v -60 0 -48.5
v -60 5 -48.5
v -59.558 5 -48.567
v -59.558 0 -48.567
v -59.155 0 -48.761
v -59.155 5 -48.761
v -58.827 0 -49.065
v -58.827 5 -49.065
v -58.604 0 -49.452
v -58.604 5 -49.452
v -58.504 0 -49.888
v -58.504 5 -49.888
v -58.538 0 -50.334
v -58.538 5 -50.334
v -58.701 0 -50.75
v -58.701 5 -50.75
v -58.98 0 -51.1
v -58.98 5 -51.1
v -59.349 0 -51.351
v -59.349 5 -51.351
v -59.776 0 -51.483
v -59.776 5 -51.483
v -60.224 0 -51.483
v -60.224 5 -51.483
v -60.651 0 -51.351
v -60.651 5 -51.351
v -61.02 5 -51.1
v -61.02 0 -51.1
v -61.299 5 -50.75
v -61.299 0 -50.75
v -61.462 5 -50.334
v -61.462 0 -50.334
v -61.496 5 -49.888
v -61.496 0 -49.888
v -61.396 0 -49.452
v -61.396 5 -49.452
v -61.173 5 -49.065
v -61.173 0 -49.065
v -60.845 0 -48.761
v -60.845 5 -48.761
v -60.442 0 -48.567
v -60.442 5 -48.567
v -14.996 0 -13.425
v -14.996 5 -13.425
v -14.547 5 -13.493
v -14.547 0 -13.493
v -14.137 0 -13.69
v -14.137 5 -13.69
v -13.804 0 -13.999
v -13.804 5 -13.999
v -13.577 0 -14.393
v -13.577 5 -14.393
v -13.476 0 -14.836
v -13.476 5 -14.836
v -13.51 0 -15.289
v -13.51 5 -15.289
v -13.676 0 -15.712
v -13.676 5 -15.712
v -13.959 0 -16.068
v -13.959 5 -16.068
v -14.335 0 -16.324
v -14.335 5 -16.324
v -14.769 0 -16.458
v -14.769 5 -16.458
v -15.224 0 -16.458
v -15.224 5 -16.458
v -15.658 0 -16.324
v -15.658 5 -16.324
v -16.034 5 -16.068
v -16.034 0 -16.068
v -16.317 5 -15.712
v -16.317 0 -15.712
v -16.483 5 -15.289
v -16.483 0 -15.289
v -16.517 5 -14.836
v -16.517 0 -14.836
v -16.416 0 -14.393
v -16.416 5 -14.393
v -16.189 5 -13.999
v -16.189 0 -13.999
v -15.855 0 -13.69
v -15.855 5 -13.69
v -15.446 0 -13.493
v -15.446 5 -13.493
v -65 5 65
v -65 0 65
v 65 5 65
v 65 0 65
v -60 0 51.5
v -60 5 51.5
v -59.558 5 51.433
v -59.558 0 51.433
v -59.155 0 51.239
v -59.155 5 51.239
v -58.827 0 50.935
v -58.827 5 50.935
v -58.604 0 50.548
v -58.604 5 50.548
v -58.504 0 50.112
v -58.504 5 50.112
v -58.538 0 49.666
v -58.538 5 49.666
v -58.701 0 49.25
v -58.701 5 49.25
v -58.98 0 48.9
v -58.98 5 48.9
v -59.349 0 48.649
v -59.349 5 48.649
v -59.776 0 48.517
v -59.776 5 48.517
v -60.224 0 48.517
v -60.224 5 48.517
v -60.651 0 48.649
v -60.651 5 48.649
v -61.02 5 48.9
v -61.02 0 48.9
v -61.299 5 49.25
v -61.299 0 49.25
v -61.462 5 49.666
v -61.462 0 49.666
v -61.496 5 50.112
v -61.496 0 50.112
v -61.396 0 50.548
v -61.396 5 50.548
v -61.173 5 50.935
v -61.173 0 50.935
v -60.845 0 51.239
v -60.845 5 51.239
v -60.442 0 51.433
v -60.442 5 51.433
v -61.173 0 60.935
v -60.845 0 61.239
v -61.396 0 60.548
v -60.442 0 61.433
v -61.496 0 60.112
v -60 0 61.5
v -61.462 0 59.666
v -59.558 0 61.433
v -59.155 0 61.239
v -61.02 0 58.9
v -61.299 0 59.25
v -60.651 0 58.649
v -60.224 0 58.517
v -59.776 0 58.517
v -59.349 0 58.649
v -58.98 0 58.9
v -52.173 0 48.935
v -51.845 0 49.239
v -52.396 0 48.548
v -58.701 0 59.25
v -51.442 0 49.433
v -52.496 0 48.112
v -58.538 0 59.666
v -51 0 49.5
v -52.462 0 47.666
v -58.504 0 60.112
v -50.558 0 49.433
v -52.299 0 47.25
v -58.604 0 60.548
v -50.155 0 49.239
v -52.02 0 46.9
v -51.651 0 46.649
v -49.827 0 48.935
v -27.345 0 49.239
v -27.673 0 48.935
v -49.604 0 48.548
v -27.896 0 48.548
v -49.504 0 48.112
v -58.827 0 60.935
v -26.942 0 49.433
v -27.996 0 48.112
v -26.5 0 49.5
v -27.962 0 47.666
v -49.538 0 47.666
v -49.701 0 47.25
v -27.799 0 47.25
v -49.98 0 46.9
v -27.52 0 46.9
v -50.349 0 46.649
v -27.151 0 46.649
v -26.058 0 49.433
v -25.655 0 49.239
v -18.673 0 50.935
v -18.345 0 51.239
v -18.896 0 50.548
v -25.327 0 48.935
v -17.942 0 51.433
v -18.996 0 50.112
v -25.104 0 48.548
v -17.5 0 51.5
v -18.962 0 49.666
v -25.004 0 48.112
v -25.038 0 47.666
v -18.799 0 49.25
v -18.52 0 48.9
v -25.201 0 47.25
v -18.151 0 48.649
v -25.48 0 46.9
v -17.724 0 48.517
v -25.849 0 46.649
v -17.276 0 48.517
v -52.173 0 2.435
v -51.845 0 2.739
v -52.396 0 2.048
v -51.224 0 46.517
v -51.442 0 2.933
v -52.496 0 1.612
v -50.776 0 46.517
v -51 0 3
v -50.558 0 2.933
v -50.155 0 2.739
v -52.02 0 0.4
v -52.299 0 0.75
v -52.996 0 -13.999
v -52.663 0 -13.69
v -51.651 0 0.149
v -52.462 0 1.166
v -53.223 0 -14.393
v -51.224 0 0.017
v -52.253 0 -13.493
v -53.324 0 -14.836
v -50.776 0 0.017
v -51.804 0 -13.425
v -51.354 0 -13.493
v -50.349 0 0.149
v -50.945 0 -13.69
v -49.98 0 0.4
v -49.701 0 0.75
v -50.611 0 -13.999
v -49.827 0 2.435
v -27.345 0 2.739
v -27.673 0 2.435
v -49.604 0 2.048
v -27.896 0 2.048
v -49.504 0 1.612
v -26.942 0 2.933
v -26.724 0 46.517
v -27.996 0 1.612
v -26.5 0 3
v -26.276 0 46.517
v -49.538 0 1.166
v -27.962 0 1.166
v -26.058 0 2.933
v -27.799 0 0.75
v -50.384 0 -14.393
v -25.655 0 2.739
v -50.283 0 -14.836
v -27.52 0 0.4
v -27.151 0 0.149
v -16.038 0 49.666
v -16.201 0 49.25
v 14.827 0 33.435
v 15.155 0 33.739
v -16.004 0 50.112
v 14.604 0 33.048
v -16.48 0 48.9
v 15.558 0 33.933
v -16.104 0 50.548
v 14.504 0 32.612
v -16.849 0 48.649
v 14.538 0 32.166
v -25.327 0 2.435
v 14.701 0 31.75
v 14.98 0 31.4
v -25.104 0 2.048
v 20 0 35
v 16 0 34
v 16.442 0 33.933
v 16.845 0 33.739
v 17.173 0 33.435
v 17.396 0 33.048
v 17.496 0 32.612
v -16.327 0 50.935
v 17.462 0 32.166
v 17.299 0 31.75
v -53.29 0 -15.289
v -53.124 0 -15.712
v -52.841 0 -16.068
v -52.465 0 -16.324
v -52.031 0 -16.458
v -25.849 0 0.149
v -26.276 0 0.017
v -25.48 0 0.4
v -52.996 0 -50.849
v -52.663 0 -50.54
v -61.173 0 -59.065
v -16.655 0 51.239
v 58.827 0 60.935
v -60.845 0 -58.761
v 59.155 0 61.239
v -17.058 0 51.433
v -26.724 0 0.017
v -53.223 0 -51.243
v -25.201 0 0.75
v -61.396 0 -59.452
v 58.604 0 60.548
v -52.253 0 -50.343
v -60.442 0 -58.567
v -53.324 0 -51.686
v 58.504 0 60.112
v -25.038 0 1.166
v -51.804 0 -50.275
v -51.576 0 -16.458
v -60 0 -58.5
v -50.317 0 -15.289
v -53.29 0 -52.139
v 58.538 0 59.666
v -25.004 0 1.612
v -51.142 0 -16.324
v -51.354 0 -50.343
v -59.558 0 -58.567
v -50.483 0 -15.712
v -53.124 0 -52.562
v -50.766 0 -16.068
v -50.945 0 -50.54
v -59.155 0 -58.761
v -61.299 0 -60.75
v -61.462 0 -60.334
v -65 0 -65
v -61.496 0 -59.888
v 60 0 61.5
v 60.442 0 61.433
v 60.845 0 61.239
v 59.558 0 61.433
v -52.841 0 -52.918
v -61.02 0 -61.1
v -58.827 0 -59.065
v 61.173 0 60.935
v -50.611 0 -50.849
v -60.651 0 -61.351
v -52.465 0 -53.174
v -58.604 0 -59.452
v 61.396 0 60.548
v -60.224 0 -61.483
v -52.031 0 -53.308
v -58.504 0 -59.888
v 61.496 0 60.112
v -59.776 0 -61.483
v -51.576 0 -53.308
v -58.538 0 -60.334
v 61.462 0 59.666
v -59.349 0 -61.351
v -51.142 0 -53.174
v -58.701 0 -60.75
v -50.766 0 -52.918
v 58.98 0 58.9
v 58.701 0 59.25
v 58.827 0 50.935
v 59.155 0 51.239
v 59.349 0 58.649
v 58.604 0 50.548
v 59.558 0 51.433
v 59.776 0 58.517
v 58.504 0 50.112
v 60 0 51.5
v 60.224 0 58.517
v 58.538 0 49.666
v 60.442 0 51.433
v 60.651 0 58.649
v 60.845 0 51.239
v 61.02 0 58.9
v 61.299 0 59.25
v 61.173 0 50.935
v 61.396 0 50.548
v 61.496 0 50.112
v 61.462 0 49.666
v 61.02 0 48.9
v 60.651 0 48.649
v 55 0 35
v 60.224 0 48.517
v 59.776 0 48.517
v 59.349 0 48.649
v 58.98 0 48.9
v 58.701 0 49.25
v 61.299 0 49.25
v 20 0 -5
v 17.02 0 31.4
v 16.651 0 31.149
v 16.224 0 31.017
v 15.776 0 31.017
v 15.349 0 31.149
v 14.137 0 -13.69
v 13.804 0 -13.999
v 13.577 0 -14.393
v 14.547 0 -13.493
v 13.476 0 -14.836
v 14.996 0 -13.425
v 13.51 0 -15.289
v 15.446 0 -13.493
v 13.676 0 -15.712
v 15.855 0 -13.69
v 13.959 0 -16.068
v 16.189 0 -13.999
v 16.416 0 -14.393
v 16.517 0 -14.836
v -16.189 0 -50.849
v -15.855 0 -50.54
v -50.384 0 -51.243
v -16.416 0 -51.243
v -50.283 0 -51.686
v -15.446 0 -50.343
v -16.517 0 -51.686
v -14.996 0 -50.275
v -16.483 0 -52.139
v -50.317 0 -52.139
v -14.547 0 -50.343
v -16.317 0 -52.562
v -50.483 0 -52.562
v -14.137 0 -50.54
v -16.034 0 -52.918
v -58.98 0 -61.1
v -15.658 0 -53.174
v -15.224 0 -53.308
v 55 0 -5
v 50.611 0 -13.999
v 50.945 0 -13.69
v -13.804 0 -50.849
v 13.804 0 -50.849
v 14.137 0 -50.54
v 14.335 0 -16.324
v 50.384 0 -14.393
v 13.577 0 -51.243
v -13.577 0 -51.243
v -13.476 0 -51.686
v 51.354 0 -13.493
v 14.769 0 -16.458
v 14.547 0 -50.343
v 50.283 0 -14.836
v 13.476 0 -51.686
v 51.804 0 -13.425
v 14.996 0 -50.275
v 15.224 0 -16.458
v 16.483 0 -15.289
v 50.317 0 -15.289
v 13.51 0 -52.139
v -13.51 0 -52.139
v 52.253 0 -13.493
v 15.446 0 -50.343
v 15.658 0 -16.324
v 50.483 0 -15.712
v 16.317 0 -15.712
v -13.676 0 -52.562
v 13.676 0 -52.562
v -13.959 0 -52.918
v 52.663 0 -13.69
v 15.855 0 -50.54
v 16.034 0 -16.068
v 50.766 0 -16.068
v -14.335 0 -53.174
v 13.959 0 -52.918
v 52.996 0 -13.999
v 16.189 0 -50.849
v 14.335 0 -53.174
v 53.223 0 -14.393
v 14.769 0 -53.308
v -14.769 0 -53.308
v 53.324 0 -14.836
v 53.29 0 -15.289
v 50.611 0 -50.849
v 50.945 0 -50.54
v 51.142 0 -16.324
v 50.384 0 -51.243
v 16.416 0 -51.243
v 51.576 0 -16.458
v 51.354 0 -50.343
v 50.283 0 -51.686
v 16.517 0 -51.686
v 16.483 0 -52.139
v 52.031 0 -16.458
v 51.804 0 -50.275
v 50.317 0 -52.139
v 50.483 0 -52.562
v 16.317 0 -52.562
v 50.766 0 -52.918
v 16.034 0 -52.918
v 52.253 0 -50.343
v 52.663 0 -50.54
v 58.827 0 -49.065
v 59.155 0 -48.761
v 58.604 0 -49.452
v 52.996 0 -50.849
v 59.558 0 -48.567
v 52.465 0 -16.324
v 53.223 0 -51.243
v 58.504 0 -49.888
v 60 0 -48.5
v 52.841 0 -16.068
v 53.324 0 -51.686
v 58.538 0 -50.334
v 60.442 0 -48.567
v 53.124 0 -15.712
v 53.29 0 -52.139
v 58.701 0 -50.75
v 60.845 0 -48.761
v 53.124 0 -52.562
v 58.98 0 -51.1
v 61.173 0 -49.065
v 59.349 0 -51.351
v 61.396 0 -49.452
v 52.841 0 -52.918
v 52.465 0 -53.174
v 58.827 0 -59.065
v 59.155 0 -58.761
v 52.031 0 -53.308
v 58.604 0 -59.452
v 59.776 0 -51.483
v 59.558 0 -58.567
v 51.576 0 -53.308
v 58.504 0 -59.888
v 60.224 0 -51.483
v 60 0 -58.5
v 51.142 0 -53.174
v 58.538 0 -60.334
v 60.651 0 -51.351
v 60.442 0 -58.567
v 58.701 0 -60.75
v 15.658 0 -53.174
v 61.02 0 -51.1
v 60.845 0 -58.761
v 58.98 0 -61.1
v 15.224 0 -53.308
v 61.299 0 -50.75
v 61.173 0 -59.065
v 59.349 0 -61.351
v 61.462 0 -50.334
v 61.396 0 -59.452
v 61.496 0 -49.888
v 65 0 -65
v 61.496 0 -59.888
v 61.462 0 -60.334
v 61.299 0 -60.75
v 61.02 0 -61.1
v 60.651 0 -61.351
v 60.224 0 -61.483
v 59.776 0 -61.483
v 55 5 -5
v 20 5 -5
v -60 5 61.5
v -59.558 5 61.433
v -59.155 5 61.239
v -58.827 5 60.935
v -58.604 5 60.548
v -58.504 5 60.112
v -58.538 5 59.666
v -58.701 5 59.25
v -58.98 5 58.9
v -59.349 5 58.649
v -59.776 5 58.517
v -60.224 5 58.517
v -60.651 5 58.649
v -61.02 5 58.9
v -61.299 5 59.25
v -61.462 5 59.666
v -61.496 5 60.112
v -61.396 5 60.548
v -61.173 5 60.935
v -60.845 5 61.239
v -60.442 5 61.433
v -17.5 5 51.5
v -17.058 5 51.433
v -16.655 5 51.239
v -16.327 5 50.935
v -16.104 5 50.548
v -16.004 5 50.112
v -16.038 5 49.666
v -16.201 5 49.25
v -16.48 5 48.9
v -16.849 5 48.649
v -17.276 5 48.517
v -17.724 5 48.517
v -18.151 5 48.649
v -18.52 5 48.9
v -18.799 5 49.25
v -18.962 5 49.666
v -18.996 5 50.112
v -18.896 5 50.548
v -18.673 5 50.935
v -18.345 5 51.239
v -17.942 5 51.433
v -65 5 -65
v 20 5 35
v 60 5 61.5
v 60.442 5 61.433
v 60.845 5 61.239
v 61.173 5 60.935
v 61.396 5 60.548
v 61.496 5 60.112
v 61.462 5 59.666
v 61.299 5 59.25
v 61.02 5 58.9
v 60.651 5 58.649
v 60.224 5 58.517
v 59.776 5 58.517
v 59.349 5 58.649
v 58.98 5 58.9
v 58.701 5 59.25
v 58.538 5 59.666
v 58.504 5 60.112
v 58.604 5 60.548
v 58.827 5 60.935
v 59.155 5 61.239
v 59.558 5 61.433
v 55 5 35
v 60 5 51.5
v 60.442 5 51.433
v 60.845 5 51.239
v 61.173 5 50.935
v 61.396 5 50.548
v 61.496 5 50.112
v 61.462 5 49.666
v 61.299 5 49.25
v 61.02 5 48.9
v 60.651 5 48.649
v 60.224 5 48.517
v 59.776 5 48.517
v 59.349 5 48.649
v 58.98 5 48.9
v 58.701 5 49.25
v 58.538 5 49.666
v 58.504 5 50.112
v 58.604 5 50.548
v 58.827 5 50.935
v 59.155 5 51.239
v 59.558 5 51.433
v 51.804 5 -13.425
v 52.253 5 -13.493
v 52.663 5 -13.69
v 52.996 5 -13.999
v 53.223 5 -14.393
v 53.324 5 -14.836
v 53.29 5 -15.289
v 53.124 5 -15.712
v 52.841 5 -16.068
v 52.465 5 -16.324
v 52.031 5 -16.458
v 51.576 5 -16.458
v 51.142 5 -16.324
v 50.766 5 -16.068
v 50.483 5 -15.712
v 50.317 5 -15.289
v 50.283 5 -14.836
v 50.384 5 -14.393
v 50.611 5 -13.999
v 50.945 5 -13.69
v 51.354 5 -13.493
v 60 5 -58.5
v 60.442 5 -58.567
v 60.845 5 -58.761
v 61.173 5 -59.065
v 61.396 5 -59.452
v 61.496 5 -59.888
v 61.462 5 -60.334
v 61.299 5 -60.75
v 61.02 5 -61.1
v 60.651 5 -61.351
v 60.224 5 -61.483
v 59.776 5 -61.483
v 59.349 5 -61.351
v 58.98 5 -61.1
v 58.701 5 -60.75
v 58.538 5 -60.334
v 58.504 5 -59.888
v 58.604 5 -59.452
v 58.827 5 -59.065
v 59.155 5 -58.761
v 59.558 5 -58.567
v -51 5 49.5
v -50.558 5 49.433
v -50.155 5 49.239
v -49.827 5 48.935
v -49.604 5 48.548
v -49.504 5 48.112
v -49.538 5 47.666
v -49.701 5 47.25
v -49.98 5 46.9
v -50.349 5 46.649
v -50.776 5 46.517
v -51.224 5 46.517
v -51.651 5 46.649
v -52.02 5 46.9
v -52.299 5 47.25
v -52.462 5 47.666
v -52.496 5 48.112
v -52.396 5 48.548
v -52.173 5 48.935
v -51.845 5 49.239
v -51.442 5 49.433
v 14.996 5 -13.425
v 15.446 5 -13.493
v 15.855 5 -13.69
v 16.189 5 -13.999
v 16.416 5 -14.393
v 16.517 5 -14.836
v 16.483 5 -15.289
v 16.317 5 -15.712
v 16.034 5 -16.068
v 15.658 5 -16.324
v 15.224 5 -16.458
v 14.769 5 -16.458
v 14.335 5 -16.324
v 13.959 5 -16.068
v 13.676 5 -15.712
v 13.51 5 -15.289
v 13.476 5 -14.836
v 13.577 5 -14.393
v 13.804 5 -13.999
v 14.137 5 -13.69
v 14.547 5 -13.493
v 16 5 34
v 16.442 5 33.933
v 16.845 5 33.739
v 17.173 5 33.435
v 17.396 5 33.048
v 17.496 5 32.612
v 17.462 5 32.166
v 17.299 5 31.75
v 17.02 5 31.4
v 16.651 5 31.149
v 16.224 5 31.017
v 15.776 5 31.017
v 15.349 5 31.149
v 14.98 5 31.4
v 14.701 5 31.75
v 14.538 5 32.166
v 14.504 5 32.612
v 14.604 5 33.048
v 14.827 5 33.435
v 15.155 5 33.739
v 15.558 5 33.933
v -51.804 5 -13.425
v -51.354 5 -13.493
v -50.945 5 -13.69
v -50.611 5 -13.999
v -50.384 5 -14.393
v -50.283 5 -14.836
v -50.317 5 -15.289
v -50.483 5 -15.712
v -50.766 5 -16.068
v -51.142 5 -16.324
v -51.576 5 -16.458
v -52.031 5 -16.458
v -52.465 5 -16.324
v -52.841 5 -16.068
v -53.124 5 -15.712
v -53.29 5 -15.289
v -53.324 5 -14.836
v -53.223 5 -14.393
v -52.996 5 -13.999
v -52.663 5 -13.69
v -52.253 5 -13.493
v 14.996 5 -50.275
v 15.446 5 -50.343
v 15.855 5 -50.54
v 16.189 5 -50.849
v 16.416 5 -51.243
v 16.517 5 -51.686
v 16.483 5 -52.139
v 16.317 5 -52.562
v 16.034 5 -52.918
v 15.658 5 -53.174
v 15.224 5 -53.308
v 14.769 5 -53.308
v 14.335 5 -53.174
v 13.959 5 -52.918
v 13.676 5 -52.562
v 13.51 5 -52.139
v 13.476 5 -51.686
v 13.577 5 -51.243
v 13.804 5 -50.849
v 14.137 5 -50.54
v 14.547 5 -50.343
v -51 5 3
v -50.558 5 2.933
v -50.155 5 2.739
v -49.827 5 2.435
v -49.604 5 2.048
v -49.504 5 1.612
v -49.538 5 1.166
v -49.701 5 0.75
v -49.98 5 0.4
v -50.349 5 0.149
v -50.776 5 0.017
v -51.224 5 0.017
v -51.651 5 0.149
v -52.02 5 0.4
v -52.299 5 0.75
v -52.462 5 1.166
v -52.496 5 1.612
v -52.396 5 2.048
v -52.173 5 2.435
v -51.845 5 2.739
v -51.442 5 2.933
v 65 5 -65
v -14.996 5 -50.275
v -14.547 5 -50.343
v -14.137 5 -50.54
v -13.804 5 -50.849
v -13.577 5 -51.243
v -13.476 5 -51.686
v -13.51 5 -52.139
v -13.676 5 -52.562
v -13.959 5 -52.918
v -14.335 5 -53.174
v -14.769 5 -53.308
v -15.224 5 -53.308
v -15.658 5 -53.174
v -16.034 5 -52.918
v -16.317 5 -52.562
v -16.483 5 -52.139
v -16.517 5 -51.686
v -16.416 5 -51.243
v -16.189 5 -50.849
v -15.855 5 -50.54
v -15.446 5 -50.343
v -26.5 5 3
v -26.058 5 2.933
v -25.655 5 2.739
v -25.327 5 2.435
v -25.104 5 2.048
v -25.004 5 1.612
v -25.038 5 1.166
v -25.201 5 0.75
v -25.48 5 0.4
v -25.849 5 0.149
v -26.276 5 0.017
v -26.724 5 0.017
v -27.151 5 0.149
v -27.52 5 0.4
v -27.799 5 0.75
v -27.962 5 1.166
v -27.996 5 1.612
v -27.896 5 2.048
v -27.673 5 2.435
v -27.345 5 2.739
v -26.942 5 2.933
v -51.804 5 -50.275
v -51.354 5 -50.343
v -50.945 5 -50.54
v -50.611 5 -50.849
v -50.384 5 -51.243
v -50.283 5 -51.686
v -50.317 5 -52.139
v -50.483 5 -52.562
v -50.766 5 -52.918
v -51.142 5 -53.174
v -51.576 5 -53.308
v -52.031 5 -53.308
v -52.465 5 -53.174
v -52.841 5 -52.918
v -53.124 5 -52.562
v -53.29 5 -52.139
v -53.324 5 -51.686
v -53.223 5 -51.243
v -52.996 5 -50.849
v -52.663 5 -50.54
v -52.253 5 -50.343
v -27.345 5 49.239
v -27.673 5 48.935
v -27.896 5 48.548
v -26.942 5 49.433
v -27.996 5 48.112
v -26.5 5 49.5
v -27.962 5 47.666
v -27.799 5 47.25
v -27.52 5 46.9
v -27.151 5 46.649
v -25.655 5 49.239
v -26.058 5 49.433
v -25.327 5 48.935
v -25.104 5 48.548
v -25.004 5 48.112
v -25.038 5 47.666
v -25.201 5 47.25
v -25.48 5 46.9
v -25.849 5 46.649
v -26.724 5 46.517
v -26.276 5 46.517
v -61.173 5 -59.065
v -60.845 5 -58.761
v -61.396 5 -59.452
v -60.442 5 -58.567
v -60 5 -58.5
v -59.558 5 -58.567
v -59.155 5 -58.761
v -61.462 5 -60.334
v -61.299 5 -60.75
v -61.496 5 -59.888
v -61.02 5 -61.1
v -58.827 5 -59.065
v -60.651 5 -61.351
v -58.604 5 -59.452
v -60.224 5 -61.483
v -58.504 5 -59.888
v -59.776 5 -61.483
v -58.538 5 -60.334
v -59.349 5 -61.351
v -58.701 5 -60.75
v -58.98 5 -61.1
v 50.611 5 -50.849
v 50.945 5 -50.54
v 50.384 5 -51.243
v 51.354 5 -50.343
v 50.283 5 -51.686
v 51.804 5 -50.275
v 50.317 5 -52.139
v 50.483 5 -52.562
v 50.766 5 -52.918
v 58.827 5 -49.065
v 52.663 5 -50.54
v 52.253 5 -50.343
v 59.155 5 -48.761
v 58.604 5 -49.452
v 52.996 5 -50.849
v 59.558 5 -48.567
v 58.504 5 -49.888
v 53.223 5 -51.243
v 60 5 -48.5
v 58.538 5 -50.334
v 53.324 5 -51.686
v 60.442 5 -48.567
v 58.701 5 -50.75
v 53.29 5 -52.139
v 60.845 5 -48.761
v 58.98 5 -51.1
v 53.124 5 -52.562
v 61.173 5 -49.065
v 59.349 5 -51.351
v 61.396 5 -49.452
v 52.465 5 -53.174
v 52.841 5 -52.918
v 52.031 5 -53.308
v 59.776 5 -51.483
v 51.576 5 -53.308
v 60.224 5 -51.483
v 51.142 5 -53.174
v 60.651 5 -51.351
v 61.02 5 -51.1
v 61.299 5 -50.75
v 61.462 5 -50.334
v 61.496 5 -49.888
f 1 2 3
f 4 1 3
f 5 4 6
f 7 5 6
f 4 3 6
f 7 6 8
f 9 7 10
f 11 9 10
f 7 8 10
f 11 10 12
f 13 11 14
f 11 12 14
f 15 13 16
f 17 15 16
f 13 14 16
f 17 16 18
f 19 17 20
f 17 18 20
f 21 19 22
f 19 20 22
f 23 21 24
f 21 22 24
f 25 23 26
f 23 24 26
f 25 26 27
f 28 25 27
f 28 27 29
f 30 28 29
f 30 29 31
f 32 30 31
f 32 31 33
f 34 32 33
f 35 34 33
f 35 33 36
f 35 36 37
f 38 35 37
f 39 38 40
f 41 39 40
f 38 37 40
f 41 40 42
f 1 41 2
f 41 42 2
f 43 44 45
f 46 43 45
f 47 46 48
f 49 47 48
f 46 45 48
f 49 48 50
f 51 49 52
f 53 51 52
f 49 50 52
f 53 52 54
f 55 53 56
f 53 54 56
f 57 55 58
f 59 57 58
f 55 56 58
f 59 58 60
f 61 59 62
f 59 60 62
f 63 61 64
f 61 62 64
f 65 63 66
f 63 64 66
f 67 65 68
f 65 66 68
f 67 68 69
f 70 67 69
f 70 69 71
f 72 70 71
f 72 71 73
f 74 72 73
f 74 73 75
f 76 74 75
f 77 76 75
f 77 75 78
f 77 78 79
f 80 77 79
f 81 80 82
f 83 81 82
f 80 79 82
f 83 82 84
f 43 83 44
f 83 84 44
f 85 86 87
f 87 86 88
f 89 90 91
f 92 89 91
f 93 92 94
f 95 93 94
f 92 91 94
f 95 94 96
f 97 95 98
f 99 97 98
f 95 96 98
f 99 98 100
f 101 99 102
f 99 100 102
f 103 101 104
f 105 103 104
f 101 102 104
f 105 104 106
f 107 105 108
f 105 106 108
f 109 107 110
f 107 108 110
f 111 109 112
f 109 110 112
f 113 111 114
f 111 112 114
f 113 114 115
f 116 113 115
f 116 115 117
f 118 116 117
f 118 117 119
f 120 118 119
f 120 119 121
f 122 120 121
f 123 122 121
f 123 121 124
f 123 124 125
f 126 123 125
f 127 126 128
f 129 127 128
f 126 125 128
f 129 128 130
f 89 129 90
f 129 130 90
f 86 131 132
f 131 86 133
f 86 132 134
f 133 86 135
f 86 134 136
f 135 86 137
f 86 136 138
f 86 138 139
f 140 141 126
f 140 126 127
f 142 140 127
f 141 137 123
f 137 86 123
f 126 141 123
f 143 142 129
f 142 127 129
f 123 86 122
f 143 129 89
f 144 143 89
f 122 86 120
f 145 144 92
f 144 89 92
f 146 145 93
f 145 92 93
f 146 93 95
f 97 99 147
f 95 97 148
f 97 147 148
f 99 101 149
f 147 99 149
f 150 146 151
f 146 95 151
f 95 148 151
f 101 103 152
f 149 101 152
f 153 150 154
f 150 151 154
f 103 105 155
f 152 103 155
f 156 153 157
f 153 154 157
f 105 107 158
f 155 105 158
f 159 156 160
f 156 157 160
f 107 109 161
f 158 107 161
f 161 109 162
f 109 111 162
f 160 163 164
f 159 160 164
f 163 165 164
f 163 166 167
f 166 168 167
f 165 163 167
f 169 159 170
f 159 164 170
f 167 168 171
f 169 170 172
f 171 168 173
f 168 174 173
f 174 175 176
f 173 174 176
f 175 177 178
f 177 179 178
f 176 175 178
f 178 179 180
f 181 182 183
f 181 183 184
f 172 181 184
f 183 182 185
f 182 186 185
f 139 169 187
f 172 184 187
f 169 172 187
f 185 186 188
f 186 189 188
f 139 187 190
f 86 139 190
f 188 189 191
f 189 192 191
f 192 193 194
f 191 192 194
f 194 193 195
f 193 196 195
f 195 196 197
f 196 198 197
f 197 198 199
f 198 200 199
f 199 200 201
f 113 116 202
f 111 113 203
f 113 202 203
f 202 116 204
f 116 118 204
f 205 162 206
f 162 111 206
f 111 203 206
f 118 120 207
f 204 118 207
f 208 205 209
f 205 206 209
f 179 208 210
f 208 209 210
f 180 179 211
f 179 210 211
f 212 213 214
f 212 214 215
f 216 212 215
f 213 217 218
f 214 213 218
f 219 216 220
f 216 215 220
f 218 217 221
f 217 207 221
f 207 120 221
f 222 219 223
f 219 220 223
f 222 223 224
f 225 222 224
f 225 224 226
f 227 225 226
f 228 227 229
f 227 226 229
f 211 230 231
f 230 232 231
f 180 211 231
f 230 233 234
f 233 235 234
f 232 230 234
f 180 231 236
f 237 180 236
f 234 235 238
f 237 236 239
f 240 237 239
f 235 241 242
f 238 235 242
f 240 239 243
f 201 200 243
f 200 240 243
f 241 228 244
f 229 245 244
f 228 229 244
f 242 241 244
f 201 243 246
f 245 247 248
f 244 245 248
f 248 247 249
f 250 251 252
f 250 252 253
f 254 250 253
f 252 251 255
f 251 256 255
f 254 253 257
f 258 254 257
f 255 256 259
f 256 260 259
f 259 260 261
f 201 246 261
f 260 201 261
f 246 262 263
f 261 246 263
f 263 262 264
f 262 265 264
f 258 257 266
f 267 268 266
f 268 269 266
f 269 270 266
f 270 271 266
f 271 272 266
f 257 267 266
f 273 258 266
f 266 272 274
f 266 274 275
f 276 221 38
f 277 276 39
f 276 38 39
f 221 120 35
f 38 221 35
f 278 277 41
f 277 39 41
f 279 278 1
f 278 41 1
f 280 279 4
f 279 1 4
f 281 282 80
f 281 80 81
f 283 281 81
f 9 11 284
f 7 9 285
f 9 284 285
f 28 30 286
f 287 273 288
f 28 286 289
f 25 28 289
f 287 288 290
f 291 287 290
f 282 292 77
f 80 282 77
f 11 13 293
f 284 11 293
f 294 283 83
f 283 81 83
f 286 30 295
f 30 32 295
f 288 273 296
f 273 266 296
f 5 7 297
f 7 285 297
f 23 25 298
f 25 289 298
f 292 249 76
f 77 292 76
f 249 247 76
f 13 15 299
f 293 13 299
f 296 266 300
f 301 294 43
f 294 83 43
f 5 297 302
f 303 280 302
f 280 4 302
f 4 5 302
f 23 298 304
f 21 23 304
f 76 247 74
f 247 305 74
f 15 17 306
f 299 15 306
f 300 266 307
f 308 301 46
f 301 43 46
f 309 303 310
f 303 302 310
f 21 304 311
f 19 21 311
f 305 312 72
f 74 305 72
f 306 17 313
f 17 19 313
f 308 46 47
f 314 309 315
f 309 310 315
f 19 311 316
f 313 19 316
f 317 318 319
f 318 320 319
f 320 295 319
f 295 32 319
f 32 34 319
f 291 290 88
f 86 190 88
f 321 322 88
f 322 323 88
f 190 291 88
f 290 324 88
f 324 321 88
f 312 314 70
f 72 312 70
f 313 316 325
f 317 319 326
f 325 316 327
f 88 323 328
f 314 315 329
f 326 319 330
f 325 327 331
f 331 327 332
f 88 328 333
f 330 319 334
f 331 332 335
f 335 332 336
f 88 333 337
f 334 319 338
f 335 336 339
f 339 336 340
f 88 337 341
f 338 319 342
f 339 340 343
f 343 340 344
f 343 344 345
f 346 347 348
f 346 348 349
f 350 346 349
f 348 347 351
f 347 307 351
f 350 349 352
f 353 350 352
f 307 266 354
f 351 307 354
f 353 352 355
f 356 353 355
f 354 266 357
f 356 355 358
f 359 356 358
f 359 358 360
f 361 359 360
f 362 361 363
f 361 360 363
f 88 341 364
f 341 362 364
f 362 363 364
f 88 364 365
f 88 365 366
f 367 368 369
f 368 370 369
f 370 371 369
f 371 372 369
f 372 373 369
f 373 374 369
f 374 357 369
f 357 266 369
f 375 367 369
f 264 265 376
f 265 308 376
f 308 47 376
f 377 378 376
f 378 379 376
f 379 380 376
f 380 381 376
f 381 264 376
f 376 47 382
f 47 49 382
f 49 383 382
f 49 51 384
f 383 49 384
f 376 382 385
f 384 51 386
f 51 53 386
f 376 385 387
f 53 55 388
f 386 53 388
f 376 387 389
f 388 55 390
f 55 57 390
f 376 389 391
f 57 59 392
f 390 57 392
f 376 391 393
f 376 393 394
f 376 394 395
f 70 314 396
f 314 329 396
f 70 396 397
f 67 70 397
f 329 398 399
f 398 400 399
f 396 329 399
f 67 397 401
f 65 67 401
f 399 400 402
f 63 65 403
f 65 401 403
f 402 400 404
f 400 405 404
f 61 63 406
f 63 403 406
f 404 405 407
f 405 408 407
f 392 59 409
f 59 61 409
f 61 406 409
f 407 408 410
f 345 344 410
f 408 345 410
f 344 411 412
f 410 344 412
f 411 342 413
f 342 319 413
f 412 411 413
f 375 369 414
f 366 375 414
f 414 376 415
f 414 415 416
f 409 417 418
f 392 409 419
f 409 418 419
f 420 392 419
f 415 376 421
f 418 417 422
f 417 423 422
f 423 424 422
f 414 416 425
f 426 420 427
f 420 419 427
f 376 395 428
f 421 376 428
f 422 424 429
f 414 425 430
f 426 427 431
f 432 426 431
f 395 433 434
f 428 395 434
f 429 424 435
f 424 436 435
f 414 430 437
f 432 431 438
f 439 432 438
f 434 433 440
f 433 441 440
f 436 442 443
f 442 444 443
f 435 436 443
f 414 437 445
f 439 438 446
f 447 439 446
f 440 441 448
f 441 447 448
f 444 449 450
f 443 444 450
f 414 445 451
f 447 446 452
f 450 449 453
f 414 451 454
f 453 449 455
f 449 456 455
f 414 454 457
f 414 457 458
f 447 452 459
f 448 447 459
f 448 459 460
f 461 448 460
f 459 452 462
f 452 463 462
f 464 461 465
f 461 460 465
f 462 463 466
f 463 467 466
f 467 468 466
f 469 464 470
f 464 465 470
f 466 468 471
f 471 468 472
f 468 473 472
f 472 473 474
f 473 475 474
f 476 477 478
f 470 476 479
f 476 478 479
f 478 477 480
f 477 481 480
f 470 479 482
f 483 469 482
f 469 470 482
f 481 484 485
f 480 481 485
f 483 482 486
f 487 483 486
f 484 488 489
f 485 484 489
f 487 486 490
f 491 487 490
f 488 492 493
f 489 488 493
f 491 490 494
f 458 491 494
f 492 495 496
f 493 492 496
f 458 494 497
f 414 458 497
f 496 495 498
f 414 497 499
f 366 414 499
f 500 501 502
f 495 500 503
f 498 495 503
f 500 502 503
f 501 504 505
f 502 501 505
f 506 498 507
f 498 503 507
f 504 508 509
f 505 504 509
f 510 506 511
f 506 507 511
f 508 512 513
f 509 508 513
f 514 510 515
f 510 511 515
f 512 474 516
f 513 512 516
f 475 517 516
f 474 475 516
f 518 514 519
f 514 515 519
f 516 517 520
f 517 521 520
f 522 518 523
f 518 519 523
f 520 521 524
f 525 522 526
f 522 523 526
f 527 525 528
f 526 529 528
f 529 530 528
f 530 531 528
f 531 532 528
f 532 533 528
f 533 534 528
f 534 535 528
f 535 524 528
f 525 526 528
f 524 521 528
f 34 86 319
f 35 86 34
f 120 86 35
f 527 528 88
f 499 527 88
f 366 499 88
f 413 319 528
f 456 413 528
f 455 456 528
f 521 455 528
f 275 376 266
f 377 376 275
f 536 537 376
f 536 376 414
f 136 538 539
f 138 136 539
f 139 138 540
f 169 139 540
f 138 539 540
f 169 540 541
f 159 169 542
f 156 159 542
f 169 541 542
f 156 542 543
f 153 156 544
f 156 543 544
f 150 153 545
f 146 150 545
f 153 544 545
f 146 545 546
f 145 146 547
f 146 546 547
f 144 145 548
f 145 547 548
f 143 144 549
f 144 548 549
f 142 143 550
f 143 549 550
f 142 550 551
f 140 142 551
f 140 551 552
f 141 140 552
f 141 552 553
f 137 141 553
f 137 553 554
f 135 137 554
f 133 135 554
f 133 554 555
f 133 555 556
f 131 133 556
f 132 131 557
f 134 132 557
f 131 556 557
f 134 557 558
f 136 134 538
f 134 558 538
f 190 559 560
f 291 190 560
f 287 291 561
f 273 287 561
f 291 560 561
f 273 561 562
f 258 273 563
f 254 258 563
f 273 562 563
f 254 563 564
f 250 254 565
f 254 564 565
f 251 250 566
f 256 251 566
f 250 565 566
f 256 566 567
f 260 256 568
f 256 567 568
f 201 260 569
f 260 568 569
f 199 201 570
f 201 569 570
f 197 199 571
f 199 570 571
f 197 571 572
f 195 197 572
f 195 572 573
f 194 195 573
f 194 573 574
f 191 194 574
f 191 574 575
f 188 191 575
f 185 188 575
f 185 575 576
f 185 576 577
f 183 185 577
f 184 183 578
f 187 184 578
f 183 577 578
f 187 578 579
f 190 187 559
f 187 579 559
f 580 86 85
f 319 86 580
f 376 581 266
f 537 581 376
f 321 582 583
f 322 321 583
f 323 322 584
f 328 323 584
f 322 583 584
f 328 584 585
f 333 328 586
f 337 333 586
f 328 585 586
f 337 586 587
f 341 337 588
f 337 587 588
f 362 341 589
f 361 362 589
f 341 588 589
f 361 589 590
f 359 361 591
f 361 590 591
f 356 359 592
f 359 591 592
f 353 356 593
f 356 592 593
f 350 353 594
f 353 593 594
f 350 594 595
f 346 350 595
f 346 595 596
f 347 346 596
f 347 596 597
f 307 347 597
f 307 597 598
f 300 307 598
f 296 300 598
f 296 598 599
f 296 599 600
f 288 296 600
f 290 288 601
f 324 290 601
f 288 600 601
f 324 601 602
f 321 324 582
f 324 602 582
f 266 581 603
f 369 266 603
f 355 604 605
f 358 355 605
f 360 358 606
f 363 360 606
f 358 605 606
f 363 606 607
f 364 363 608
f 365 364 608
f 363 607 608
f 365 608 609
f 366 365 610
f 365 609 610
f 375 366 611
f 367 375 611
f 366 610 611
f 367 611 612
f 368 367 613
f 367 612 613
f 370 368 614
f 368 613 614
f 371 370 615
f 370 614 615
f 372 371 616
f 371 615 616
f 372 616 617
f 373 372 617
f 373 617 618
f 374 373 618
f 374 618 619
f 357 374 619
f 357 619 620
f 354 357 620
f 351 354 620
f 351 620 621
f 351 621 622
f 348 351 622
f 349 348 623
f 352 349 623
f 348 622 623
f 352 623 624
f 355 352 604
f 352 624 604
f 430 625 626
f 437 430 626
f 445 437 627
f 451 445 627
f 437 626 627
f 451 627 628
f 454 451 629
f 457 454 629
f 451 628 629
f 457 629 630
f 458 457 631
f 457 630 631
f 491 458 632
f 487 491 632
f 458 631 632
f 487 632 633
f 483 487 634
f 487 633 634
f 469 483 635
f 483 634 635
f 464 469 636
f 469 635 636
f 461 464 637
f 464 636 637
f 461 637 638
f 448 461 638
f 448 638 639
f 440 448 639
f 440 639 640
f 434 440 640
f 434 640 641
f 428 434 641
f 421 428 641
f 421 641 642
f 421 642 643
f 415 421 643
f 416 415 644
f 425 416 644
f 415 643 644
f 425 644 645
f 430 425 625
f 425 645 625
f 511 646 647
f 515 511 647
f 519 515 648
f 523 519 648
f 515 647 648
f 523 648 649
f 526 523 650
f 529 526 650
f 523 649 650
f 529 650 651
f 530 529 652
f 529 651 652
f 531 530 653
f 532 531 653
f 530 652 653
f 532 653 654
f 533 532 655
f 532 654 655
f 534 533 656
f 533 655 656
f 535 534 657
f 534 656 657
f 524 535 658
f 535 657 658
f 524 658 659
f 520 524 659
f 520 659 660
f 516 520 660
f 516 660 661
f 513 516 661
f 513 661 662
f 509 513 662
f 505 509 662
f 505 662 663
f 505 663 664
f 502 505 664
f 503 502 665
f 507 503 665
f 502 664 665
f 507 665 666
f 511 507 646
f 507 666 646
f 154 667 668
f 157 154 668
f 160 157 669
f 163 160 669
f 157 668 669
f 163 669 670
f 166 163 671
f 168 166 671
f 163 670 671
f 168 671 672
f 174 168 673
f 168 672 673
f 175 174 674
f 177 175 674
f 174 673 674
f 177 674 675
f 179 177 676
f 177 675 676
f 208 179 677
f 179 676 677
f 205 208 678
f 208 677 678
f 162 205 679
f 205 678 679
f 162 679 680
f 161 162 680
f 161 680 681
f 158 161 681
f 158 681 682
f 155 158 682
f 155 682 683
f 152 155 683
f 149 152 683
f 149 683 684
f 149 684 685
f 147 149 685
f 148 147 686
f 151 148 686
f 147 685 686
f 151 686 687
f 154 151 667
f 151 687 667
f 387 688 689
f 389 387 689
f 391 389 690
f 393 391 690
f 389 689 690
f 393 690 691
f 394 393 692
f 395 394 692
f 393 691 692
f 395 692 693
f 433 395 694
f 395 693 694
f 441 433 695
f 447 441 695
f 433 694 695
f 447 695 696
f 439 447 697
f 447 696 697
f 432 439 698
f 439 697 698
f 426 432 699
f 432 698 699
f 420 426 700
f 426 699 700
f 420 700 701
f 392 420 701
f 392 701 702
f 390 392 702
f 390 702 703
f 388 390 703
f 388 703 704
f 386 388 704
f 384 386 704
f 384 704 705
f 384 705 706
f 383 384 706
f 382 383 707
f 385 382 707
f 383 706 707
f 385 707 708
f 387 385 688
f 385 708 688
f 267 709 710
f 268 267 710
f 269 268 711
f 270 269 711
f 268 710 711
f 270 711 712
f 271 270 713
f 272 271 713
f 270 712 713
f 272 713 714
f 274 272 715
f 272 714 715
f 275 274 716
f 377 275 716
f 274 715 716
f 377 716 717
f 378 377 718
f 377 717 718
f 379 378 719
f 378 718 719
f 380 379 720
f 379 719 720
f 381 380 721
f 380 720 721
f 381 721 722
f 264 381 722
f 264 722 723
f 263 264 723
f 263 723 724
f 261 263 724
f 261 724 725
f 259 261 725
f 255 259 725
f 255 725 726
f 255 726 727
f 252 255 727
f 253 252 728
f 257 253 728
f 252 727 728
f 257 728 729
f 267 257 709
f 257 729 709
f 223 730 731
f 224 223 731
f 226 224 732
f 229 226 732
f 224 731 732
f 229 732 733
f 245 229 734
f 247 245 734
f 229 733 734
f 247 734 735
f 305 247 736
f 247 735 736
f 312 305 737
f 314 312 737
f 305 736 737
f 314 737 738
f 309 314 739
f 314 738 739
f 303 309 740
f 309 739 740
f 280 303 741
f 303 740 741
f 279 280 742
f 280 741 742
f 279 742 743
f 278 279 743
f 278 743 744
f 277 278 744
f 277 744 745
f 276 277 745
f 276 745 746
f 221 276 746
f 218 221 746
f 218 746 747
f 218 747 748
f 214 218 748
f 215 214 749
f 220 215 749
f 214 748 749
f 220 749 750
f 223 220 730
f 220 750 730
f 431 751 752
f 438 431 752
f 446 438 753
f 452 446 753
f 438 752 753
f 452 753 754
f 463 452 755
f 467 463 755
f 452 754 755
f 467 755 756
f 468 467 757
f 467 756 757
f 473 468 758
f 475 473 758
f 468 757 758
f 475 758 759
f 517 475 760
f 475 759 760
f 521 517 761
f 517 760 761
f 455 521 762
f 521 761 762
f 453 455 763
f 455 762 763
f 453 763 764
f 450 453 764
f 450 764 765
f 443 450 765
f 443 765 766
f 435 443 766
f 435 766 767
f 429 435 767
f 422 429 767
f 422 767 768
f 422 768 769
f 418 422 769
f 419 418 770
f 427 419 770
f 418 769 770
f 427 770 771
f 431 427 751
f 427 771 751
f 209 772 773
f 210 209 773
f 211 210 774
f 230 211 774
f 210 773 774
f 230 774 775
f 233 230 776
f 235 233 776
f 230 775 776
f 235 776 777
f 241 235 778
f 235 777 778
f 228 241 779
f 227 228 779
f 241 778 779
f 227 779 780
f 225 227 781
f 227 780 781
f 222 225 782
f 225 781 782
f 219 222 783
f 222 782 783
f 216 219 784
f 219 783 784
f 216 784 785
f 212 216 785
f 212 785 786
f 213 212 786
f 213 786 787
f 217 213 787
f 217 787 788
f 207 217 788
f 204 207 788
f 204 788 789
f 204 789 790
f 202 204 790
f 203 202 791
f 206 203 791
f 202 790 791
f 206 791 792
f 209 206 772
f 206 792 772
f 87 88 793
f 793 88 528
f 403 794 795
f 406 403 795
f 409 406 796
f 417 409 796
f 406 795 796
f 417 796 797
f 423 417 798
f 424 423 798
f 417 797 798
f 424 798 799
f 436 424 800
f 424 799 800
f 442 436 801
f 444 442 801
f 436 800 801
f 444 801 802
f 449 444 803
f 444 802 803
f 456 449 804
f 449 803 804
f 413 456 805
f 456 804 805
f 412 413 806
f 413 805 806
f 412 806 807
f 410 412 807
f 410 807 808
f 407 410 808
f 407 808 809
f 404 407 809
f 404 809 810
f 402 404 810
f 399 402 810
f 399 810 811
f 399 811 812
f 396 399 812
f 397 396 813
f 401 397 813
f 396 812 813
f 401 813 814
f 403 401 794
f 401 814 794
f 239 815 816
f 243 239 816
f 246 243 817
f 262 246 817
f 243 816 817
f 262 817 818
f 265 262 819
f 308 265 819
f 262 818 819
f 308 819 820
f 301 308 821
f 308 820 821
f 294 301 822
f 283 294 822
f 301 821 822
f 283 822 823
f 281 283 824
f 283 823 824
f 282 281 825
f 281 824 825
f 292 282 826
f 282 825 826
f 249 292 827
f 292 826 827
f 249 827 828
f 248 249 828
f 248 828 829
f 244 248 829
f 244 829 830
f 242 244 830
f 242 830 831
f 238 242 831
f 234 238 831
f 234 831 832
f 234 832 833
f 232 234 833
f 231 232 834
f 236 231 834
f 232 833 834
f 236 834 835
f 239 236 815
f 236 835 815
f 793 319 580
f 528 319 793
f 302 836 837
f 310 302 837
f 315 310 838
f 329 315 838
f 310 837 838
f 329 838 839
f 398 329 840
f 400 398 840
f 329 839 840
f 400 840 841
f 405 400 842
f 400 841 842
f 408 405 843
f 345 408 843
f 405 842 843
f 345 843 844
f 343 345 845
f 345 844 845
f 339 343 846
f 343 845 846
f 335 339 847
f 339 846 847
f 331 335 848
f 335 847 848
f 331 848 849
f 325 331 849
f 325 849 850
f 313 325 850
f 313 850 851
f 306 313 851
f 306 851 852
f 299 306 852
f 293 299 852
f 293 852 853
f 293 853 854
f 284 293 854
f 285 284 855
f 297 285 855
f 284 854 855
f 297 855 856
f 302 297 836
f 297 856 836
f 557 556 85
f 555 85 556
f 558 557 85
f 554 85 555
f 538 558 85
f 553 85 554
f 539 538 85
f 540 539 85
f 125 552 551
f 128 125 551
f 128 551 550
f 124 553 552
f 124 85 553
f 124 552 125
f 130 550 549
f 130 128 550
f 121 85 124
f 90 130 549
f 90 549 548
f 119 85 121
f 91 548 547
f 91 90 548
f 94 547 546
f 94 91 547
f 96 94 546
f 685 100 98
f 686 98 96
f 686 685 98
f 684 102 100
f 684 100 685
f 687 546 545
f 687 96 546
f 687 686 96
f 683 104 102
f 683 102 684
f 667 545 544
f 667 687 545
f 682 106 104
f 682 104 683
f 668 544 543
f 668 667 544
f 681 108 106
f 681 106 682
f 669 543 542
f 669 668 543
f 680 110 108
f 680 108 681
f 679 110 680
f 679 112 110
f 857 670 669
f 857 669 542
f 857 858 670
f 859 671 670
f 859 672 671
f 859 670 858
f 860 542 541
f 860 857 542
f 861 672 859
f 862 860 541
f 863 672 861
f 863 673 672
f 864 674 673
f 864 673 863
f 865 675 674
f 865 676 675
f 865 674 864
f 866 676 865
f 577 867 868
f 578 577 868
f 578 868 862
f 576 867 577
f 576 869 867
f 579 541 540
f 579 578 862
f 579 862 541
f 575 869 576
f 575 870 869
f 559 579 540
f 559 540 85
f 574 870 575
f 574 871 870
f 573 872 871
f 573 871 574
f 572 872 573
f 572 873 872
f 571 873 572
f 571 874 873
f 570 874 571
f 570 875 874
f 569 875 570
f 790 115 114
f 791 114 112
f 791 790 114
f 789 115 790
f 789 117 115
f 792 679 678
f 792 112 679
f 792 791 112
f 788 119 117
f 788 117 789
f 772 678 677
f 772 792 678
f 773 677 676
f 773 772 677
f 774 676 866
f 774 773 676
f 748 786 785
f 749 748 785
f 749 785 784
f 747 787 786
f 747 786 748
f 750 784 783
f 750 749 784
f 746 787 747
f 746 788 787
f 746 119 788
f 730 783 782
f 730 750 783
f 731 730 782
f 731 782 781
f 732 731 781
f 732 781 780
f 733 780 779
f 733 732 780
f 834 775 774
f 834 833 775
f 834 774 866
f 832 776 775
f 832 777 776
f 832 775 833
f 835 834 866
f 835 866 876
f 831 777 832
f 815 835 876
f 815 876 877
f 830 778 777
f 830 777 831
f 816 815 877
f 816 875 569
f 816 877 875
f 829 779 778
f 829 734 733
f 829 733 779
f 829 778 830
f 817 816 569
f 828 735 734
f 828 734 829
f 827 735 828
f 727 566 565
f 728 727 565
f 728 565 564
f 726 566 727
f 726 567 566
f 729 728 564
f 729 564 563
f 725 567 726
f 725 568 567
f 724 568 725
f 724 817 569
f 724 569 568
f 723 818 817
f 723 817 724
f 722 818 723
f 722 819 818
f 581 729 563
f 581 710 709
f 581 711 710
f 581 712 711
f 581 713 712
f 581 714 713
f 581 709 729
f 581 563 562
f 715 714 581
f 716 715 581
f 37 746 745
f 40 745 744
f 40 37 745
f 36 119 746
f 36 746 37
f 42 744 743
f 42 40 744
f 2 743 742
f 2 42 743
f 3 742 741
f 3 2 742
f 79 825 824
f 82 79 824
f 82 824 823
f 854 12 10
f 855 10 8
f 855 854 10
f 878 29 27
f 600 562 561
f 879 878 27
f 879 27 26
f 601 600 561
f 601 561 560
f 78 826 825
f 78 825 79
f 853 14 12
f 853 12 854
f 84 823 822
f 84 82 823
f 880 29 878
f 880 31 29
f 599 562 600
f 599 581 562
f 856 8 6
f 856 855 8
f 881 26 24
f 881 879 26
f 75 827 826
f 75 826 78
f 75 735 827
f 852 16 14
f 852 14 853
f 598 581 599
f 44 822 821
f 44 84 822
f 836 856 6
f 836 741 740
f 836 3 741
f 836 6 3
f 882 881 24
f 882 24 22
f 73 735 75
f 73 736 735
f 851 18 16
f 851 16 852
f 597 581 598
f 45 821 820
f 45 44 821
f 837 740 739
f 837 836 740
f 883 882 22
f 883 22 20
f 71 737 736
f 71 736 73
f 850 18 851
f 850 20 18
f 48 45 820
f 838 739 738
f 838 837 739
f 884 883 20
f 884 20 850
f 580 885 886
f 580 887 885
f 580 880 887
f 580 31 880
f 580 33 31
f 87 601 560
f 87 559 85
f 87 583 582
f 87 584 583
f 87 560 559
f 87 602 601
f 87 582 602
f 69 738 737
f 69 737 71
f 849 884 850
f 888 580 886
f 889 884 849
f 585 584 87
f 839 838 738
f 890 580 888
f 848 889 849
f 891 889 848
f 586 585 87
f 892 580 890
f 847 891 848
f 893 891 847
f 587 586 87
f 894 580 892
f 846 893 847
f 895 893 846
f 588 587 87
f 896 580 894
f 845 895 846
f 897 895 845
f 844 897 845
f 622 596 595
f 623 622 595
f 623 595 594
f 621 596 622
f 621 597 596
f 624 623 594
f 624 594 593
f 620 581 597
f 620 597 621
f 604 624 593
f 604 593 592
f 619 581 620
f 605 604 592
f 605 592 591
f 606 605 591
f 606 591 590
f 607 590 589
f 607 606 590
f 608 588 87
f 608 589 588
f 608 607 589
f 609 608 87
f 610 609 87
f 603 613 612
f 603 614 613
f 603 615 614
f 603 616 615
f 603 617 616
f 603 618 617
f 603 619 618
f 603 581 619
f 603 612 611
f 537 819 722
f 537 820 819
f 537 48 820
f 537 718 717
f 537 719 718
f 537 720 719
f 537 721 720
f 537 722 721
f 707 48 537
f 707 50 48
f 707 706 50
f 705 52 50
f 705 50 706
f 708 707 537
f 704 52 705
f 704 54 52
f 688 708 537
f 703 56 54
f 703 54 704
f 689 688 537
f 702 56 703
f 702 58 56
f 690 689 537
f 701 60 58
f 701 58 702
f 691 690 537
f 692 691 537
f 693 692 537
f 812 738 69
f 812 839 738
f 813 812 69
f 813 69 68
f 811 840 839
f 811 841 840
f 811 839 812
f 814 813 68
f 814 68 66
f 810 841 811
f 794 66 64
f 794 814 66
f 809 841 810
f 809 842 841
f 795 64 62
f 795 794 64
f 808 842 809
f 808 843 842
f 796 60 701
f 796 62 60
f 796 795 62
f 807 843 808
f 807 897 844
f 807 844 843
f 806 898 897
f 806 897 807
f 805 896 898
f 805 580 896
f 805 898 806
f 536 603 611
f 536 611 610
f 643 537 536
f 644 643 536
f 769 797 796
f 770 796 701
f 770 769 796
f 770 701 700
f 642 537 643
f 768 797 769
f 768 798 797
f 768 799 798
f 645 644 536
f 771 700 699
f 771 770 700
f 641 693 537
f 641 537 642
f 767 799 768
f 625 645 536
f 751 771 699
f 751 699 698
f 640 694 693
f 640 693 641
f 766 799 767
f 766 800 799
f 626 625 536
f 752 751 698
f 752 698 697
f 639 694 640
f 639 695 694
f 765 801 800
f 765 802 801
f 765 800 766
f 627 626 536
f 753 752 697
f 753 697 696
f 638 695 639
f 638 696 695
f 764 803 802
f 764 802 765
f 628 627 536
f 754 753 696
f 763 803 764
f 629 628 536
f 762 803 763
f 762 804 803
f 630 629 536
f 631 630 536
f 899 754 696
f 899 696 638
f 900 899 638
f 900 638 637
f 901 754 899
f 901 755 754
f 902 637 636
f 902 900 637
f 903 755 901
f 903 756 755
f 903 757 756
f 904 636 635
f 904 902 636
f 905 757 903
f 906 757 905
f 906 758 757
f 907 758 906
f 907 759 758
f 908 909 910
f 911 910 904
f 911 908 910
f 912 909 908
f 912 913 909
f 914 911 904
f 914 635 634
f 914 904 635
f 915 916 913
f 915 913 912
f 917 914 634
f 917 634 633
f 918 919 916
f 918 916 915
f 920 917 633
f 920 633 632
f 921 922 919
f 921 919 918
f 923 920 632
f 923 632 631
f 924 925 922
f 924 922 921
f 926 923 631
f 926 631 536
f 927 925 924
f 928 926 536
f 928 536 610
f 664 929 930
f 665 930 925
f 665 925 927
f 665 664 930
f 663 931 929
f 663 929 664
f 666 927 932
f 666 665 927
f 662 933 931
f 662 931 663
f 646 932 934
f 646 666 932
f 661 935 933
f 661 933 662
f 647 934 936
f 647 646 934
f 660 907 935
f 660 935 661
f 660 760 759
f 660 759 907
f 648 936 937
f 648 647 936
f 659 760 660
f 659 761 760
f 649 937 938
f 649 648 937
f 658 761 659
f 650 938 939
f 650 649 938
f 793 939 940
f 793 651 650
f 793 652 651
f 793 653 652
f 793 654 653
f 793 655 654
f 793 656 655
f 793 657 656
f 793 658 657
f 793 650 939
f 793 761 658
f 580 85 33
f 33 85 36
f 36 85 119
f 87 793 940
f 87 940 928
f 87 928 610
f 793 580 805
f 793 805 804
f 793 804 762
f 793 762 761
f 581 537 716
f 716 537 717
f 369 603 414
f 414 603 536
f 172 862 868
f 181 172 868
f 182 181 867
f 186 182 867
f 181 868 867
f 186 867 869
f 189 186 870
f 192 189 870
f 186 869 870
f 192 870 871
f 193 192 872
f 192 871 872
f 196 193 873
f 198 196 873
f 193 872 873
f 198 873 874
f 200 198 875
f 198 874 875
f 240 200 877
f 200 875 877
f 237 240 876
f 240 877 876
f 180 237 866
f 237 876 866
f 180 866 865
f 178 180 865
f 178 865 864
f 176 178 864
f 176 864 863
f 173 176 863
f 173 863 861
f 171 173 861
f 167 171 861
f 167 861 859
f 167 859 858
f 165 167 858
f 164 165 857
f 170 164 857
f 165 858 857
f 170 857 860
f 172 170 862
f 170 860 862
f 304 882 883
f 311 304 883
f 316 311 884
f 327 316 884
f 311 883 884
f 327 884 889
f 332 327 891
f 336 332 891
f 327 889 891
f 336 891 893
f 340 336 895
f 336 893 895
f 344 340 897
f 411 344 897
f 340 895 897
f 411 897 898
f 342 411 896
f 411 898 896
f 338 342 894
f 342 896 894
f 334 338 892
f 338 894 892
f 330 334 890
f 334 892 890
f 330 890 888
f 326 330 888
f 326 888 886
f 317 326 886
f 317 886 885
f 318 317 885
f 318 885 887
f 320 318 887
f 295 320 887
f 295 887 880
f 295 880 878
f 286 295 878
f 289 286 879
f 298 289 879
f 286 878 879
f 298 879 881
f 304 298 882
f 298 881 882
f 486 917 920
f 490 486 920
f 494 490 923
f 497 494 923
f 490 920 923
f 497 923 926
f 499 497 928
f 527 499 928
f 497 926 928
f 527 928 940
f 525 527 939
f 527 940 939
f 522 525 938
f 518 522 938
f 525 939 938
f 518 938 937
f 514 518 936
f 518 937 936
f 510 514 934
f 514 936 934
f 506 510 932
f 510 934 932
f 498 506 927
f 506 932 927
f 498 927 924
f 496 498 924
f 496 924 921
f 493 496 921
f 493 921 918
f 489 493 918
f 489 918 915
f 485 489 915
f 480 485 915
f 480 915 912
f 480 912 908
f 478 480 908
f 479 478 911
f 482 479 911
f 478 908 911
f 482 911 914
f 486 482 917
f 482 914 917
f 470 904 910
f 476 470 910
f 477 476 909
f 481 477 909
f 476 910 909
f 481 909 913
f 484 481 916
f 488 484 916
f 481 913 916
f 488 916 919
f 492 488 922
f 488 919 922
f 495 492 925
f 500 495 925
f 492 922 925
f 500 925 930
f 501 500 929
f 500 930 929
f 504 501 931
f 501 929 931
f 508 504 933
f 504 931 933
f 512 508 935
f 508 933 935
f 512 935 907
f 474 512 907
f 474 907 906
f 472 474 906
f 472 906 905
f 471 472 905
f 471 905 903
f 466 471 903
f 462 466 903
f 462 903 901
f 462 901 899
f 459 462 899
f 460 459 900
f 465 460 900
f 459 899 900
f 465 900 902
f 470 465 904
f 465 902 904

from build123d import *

# Parameters (mm, degrees)
SKETCH1_W           = 130
SKETCH1_H           = 130
BOSS_EXTRUDE1_DEPTH = 5
SKETCH4_R           = 1.5
CUT_EXTRUDE1_DEPTH  = 5
SKETCH8_R           = 1.5
CUT_EXTRUDE4_DEPTH  = 5
SKETCH9_W           = 35
SKETCH9_H           = 40
CUT_EXTRUDE5_DEPTH  = 5
SKETCH10_R          = 1.5
CUT_EXTRUDE6_DEPTH  = 5
SKETCH11_R          = 1.525
SKETCH11_R_2        = 1.5
CUT_EXTRUDE7_DEPTH  = 5
SKETCH12_R          = 1.5
CUT_EXTRUDE8_DEPTH  = 5


with BuildPart() as part:
    # Sketch1 → Boss-Extrude1 (new body)
    with BuildSketch(Plane(origin=(0, 0, 0), x_dir=(1, 0, 0), z_dir=(0, 1, 0))):
        Rectangle(SKETCH1_W, SKETCH1_H)
    extrude(amount=BOSS_EXTRUDE1_DEPTH)

    # Sketch4 → Cut-Extrude1 (cut)
    with BuildSketch(Plane(origin=(0, 5, 0), x_dir=(1, 0, 0), z_dir=(0, 1, 0))):
        with Locations(Location((60, 60, 0), (0, 0, 270))):
            Circle(SKETCH4_R)
        with Locations(Location((60, -60, 0), (0, 0, 270))):
            Circle(SKETCH4_R)
        with Locations(Location((-60, -60, 0), (0, 0, 270))):
            Circle(SKETCH4_R)
        with Locations(Location((-60, 60, 0), (0, 0, 270))):
            Circle(SKETCH4_R)
    extrude(amount=-CUT_EXTRUDE1_DEPTH, mode=Mode.SUBTRACT)

    # Sketch8 → Cut-Extrude4 (cut)
    with BuildSketch(Plane(origin=(0, 5, 0), x_dir=(1, 0, 0), z_dir=(0, 1, 0))):
        with Locations(Location((-60, 50, 0), (0, 0, 270))):
            Circle(SKETCH8_R)
        with Locations(Location((60, 50, 0), (0, 0, 270))):
            Circle(SKETCH8_R)
        with Locations(Location((60, -50, 0), (0, 0, 270))):
            Circle(SKETCH8_R)
        with Locations(Location((-60, -50, 0), (0, 0, 270))):
            Circle(SKETCH8_R)
    extrude(amount=-CUT_EXTRUDE4_DEPTH, mode=Mode.SUBTRACT)

    # Sketch9 → Cut-Extrude5 (cut)
    with BuildSketch(Plane(origin=(0, 5, 0), x_dir=(1, 0, 0), z_dir=(0, 1, 0))):
        with Locations((37.5, -15)):
            Rectangle(SKETCH9_W, SKETCH9_H)
    extrude(amount=-CUT_EXTRUDE5_DEPTH, mode=Mode.SUBTRACT)

    # Sketch10 → Cut-Extrude6 (cut)
    with BuildSketch(Plane(origin=(0, 5, 0), x_dir=(1, 0, 0), z_dir=(0, 1, 0))):
        with Locations(Location((-17.5, -50, 0), (0, 0, 270))):
            Circle(SKETCH10_R)
    extrude(amount=-CUT_EXTRUDE6_DEPTH, mode=Mode.SUBTRACT)

    # Sketch11 → Cut-Extrude7 (cut)
    with BuildSketch(Plane(origin=(0, 5, 0), x_dir=(1, 0, 0), z_dir=(0, 1, 0))):
        with Locations(Location((-51.803699422, 51.8, 0), (0, 0, 270))):
            Circle(SKETCH11_R)
        with Locations(Location((-14.996300578, 51.8, 0), (0, 0, 270))):
            Circle(SKETCH11_R)
        with Locations(Location((14.996300578, 51.8, 0), (0, 0, 270))):
            Circle(SKETCH11_R)
        with Locations(Location((51.803699422, 51.8, 0), (0, 0, 270))):
            Circle(SKETCH11_R)
        with Locations(Location((51.803699422, 14.95, 0), (0, 0, 270))):
            Circle(SKETCH11_R)
        with Locations(Location((14.996300578, 14.95, 0), (0, 0, 270))):
            Circle(SKETCH11_R)
        with Locations(Location((-14.996300578, 14.95, 0), (0, 0, 270))):
            Circle(SKETCH11_R)
        with Locations(Location((-51.803699422, 14.95, 0), (0, 0, 270))):
            Circle(SKETCH11_R)
        with Locations(Location((-51, -1.5, 0), (0, 0, 270))):
            Circle(SKETCH11_R_2)
        with Locations(Location((-26.5, -1.5, 0), (0, 0, 270))):
            Circle(SKETCH11_R_2)
        with Locations(Location((-26.5, -48, 0), (0, 0, 270))):
            Circle(SKETCH11_R_2)
        with Locations(Location((-51, -48, 0), (0, 0, 270))):
            Circle(SKETCH11_R_2)
    extrude(amount=-CUT_EXTRUDE7_DEPTH, mode=Mode.SUBTRACT)

    # Sketch12 → Cut-Extrude8 (cut)
    with BuildSketch(Plane(origin=(0, 5, 0), x_dir=(1, 0, 0), z_dir=(0, 1, 0))):
        with Locations(Location((16, -32.5, 0), (0, 0, 270))):
            Circle(SKETCH12_R)
    extrude(amount=-CUT_EXTRUDE8_DEPTH, mode=Mode.SUBTRACT)


solid = part.part
